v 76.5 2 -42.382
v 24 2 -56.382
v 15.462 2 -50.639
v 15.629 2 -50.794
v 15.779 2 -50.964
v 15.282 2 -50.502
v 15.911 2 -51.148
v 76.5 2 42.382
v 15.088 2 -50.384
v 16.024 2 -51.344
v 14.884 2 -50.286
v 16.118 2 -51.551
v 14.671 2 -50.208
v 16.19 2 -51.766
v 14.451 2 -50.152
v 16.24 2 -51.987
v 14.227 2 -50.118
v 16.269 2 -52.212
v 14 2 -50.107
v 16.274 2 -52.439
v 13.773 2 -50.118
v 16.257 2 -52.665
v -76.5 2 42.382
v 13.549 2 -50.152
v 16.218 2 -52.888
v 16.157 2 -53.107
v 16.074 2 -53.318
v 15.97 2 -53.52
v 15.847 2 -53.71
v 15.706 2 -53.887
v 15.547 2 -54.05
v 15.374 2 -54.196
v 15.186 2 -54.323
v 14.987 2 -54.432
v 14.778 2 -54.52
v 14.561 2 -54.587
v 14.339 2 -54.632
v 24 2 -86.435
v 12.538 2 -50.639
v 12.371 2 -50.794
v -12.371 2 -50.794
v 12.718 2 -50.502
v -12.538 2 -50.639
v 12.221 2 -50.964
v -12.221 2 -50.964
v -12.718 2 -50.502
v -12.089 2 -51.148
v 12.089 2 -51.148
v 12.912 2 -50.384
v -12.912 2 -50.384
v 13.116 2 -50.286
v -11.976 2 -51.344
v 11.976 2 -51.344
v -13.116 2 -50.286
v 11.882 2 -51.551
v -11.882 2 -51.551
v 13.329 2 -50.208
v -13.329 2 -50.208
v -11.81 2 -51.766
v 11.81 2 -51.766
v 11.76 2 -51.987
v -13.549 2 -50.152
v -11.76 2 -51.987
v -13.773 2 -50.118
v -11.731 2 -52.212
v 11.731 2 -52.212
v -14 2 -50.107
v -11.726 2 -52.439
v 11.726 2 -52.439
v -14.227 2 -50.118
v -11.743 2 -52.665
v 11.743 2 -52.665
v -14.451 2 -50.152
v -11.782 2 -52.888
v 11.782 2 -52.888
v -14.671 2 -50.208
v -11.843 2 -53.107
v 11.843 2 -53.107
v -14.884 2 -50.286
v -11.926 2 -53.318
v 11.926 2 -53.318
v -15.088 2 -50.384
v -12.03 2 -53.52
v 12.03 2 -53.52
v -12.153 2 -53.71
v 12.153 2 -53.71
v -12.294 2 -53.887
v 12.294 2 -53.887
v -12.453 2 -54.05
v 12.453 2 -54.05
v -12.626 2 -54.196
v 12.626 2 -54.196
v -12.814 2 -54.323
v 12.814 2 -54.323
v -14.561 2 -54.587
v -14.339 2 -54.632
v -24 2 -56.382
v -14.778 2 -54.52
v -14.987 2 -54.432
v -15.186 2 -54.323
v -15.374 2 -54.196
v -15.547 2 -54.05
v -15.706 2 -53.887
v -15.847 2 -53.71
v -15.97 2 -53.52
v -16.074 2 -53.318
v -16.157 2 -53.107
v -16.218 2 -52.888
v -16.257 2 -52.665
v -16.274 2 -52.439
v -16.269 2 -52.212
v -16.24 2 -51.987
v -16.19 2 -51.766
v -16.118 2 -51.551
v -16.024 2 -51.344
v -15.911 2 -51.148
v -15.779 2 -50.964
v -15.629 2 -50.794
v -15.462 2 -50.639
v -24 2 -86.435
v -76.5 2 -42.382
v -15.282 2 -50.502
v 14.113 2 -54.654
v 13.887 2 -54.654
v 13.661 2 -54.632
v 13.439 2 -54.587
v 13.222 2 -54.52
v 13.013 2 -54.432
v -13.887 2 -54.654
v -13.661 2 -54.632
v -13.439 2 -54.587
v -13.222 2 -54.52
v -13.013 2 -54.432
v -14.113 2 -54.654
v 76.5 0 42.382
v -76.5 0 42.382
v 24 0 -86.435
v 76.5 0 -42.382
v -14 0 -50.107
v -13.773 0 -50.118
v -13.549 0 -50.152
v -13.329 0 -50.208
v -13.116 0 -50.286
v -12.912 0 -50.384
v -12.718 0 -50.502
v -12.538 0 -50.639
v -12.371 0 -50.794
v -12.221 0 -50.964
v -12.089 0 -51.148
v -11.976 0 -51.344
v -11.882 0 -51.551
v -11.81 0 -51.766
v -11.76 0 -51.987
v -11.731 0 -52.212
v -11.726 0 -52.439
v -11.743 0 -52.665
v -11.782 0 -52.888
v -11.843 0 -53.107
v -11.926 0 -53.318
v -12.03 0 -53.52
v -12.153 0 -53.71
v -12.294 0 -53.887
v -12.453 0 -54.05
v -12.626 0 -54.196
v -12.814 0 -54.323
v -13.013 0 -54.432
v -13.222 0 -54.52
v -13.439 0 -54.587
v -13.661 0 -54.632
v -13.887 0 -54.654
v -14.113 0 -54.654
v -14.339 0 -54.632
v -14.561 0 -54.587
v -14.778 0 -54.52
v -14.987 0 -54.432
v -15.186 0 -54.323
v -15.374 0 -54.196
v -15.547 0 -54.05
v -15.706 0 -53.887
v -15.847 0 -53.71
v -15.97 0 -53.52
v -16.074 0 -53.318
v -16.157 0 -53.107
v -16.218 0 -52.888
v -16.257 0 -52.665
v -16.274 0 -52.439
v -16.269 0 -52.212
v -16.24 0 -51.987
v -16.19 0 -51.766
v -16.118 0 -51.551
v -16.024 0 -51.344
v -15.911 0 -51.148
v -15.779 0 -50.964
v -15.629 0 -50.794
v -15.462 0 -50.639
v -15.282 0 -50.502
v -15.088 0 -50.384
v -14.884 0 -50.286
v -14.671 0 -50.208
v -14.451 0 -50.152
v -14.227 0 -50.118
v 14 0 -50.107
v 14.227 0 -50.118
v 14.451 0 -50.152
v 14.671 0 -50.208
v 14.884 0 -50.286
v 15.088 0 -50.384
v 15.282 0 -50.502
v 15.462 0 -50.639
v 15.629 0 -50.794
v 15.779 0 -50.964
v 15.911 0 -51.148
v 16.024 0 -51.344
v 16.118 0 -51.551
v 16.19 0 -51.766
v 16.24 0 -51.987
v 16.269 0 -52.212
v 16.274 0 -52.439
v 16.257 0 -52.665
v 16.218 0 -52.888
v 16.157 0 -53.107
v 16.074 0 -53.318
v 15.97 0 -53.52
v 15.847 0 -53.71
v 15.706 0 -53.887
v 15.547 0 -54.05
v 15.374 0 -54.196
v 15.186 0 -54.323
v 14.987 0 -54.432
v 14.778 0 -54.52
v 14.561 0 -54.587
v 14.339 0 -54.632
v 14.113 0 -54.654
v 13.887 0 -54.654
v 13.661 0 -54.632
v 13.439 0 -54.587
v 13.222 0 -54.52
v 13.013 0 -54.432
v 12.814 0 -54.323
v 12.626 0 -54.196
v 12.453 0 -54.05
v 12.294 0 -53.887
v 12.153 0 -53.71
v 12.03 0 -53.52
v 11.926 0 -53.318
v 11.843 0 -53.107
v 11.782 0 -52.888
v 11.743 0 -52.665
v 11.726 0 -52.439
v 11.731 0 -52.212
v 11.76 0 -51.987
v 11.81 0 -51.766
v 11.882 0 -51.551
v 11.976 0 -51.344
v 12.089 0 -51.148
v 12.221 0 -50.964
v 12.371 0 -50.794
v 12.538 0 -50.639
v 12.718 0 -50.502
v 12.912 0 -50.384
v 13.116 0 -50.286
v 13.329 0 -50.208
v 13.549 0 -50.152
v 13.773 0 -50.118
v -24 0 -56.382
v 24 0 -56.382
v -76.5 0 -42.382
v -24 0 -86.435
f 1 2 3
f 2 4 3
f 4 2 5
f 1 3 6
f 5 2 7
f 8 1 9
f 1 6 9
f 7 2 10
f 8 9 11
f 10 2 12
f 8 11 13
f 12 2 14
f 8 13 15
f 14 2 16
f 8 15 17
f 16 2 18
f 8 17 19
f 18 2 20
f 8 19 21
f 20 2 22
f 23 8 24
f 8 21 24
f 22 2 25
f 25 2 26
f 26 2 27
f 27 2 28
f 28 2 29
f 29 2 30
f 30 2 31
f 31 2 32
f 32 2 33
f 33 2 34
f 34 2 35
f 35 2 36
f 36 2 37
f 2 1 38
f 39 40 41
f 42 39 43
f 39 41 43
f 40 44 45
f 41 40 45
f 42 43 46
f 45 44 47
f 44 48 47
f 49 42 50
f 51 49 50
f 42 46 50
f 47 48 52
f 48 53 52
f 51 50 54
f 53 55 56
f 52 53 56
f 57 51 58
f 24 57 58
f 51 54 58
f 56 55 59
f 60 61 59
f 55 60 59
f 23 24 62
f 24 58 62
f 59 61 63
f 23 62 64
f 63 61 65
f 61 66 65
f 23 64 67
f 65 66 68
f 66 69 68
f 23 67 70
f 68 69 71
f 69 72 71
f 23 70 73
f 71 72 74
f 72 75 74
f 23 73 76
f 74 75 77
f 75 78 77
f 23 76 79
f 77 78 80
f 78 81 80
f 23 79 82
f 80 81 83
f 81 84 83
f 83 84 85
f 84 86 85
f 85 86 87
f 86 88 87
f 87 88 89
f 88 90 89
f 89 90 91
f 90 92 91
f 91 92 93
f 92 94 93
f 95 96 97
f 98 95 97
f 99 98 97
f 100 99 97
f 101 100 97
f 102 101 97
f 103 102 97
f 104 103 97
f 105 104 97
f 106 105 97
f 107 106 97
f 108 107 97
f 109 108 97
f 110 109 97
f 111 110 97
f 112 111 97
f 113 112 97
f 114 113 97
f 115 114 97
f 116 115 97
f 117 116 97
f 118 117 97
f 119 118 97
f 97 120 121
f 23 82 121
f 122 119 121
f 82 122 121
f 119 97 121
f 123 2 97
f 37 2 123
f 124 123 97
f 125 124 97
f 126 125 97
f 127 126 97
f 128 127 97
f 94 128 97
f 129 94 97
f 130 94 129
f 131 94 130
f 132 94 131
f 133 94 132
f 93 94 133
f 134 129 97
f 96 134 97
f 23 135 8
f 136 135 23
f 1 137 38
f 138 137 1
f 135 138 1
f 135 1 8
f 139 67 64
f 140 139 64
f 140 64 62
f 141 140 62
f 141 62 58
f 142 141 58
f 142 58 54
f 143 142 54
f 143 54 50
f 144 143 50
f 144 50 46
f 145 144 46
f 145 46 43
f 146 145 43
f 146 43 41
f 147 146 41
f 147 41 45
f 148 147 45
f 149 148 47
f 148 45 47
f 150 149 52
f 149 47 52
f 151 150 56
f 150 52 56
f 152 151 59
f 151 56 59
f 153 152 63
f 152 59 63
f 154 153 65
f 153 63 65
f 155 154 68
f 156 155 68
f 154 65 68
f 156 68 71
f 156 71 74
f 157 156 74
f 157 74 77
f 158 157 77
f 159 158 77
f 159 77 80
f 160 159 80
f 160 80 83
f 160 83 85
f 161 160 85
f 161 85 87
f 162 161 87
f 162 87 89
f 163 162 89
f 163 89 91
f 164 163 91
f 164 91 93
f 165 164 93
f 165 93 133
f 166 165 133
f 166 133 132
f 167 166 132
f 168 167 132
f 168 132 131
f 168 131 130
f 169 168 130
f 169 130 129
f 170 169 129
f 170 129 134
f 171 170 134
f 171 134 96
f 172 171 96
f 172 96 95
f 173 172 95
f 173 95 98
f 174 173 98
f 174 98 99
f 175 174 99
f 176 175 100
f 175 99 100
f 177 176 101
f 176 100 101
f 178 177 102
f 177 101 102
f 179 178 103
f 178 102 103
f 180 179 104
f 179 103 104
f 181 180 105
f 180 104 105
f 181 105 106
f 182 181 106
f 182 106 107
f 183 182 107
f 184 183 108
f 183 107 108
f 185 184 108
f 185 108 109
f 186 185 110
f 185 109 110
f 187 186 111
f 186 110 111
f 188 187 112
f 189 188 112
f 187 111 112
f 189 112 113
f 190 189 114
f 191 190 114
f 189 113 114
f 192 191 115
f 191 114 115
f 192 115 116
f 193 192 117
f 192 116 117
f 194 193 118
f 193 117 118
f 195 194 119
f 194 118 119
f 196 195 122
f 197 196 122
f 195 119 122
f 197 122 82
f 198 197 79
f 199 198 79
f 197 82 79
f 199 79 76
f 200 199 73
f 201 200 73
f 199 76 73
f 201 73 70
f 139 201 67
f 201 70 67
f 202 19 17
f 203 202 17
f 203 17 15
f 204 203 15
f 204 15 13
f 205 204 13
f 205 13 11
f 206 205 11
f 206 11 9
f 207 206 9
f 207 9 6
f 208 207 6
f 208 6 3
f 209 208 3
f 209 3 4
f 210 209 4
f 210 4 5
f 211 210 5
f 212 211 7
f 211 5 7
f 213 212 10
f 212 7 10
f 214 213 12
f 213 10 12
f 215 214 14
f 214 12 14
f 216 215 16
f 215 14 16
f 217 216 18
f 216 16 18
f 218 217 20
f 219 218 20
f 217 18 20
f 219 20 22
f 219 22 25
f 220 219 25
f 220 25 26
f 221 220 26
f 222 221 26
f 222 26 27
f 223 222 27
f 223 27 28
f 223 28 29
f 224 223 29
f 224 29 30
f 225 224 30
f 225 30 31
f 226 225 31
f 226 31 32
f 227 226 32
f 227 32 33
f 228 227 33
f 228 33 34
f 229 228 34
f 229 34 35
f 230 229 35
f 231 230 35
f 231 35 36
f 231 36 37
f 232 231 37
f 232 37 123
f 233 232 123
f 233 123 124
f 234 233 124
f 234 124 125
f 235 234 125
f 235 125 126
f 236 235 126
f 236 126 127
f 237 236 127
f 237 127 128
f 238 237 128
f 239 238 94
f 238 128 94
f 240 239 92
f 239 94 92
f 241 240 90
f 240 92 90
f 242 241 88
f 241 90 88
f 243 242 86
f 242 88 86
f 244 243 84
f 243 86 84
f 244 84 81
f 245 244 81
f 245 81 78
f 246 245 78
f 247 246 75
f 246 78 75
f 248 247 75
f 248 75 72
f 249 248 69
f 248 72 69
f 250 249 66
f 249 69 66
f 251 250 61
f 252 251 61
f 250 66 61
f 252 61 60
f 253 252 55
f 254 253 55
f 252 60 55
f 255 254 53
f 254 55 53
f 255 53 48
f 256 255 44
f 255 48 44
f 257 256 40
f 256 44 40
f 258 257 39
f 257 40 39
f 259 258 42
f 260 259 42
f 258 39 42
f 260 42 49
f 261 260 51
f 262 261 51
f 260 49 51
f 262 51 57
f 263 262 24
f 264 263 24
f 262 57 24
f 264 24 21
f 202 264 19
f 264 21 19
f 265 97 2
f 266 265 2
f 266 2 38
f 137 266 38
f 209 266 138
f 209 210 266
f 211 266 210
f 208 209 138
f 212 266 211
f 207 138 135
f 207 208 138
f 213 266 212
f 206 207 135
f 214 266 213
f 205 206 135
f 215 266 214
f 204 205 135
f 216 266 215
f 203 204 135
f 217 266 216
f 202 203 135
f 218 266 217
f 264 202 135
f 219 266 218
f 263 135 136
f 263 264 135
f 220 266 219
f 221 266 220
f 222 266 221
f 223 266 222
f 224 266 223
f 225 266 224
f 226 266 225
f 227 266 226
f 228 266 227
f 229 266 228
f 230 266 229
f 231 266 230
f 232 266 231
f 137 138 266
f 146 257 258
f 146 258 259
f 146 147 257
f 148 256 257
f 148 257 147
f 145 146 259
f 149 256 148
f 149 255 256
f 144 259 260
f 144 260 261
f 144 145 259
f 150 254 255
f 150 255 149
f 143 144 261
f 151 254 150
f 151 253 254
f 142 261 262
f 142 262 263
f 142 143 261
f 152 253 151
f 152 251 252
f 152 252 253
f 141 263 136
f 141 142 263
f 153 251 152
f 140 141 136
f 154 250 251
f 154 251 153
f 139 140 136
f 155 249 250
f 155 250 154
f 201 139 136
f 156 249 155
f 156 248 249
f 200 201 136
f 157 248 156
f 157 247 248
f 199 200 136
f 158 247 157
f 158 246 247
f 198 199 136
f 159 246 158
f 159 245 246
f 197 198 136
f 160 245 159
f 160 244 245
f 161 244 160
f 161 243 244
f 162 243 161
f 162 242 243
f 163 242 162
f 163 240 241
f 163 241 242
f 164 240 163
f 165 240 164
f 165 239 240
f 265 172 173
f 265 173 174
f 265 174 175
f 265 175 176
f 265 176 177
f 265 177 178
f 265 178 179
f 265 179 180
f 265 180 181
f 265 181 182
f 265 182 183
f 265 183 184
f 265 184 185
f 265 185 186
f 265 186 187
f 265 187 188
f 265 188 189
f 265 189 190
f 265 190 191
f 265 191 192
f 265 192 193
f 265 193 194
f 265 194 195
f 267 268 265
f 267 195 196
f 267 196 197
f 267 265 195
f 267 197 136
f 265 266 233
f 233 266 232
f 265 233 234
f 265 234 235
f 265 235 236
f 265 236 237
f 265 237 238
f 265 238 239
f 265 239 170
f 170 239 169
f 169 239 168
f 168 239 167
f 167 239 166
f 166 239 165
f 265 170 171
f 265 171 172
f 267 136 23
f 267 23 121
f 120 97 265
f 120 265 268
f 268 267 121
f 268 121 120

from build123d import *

# Parameters (mm, degrees)
EXTRUDE_1_DEPTH     = 2
SKETCH_2_W          = 48
SKETCH_2_H          = 50.191121785
CUT_EXTRUDE_1_DEPTH = 10
SKETCH_3_R          = 2.275
CUT_EXTRUDE_2_DEPTH = 10


with BuildPart() as part:
    # 草图1 → 凸台-拉伸1 (new body)
    with BuildSketch(Plane(origin=(0, 0, 0), x_dir=(1, 0, 0), z_dir=(0, 1, 0))):
        Polygon((-76.5, 42.382061447), (0, 106.573183232), (76.5, 42.382061447), (76.5, -42.382061447), (-76.5, -42.382061447), align=None)
    extrude(amount=EXTRUDE_1_DEPTH)

    # 草图2 → 切除-拉伸1 (cut)
    with BuildSketch(Plane(origin=(0, 2, 0), x_dir=(1, 0, 0), z_dir=(0, 1, 0))):
        with Locations((0, 81.47762234)):
            Rectangle(SKETCH_2_W, SKETCH_2_H)
    extrude(amount=-CUT_EXTRUDE_1_DEPTH, mode=Mode.SUBTRACT)

    # 草图3 → 切除-拉伸2 (cut)
    with BuildSketch(Plane(origin=(0, 2, 0), x_dir=(1, 0, 0), z_dir=(0, 1, 0))):
        with Locations(Location((14, 52.382061447, 0), (0, 0, 270))):
            Circle(SKETCH_3_R)
        with Locations(Location((-14, 52.382061447, 0), (0, 0, 270))):
            Circle(SKETCH_3_R)
    extrude(amount=-CUT_EXTRUDE_2_DEPTH, mode=Mode.SUBTRACT)


solid = part.part
